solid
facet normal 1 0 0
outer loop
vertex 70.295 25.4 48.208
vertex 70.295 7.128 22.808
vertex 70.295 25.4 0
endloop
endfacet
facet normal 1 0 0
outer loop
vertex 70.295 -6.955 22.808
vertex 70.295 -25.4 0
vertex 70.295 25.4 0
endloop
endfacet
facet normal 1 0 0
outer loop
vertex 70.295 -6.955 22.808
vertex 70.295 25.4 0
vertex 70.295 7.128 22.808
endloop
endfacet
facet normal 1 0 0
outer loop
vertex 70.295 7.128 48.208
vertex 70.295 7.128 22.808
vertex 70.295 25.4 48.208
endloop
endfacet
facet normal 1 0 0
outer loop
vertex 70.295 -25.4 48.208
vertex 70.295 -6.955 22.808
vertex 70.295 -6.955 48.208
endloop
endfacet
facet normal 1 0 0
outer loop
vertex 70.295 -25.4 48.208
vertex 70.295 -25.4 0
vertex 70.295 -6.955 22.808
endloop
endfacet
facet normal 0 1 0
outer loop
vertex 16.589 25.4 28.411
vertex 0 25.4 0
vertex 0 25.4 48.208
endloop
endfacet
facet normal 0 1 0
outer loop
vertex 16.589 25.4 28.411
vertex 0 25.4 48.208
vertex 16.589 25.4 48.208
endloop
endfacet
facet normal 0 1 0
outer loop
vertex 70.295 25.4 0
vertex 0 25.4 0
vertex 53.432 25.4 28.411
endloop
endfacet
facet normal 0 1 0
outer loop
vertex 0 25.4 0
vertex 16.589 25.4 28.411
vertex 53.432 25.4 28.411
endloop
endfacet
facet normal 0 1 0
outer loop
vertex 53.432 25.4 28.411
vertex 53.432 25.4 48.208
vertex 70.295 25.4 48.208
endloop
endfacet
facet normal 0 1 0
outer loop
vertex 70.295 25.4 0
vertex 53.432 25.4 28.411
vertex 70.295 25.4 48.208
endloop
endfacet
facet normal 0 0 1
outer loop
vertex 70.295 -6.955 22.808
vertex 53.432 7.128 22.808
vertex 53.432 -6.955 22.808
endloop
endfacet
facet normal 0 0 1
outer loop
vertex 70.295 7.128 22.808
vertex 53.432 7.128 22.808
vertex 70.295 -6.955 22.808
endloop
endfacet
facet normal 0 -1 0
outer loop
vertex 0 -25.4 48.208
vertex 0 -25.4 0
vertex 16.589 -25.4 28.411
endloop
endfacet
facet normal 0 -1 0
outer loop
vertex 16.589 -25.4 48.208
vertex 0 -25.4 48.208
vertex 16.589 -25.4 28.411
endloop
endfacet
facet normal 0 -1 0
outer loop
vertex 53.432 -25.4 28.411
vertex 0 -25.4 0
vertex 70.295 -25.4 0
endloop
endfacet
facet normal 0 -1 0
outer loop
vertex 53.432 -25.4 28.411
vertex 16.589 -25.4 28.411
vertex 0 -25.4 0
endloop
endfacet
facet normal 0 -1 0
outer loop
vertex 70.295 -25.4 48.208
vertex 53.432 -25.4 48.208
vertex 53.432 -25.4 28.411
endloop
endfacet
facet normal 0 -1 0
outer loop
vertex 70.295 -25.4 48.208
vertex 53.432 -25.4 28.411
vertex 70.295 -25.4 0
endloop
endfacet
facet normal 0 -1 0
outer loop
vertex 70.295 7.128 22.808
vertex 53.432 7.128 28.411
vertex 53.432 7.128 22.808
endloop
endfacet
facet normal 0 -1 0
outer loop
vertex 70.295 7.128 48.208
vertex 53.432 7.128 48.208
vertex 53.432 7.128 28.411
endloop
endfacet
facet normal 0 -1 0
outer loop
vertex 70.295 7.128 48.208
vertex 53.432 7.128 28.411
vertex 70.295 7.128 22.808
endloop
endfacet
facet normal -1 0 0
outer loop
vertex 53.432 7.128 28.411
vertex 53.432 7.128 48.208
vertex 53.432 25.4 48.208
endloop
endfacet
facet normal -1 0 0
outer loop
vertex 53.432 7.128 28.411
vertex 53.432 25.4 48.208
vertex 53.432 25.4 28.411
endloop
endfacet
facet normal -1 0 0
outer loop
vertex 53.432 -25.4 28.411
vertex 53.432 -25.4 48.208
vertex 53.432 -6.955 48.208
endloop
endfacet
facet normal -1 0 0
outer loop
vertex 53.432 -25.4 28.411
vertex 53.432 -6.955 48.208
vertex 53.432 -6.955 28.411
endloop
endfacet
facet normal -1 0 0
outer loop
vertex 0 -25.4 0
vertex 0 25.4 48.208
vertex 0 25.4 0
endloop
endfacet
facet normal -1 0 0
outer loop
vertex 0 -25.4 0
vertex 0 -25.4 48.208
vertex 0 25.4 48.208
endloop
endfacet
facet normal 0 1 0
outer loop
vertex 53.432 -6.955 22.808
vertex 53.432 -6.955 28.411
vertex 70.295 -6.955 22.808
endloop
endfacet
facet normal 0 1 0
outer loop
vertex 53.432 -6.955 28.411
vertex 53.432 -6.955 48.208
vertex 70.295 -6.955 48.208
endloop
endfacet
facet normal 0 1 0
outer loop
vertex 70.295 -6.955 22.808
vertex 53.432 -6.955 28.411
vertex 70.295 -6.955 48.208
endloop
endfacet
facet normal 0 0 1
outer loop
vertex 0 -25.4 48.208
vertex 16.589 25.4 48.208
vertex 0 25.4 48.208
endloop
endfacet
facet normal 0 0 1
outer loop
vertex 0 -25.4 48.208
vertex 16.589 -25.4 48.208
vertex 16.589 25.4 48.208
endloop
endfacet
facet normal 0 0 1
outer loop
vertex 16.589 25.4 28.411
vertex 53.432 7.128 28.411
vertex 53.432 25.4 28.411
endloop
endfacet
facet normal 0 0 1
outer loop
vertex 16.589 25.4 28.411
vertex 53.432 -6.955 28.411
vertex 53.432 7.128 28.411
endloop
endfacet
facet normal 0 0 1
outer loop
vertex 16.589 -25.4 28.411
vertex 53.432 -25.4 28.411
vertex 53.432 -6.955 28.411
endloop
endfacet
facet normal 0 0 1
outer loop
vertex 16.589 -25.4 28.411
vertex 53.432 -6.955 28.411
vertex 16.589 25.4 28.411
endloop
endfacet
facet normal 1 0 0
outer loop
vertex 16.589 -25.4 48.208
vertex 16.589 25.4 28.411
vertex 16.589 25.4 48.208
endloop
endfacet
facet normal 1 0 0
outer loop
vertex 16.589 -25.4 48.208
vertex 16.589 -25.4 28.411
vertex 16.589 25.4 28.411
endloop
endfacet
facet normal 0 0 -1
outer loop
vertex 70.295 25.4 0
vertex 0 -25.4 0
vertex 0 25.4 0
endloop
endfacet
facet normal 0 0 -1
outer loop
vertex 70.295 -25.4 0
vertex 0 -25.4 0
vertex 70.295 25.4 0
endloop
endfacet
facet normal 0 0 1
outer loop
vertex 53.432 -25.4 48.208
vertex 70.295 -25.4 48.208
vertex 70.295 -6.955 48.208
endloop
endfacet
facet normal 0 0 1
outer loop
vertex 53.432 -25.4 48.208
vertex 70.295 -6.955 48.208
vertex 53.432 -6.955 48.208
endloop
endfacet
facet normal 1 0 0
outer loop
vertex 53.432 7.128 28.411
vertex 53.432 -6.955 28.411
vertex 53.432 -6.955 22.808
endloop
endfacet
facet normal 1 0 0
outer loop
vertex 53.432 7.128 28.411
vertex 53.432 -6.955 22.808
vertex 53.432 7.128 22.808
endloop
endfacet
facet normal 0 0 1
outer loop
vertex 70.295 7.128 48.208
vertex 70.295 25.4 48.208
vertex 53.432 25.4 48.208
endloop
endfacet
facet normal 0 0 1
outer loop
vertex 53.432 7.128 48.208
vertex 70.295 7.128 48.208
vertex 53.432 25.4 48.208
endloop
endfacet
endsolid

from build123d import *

# Parameters (mm, degrees)
F1_DEPTH = 25.4
F2_W     = 16.863502562
F2_H     = 14.0826925635
F3_DEPTH = 25.4


with BuildPart() as f1:
    # F0 (on Front) → F1 (new body, symmetric)
    with BuildSketch(Plane.XZ):
        Polygon((0, 48.207629472), (0, 0), (70.2951550484, 0), (70.2951550484, 48.207629472), (53.4316524863, 48.207629472), (53.4316524863, 28.4113399684), (16.5885612369, 28.4113399684), (16.5885612369, 48.207629472), align=None)
    extrude(amount=F1_DEPTH, both=True)

    # F2 (on face) → F3 (cut)
    with BuildSketch(Plane.XY.offset(48.207629472)):
        with Locations((61.8634037673, 0.0867024064)):
            Rectangle(F2_W, F2_H)
    extrude(amount=-F3_DEPTH, mode=Mode.SUBTRACT)


solid = f1.part
